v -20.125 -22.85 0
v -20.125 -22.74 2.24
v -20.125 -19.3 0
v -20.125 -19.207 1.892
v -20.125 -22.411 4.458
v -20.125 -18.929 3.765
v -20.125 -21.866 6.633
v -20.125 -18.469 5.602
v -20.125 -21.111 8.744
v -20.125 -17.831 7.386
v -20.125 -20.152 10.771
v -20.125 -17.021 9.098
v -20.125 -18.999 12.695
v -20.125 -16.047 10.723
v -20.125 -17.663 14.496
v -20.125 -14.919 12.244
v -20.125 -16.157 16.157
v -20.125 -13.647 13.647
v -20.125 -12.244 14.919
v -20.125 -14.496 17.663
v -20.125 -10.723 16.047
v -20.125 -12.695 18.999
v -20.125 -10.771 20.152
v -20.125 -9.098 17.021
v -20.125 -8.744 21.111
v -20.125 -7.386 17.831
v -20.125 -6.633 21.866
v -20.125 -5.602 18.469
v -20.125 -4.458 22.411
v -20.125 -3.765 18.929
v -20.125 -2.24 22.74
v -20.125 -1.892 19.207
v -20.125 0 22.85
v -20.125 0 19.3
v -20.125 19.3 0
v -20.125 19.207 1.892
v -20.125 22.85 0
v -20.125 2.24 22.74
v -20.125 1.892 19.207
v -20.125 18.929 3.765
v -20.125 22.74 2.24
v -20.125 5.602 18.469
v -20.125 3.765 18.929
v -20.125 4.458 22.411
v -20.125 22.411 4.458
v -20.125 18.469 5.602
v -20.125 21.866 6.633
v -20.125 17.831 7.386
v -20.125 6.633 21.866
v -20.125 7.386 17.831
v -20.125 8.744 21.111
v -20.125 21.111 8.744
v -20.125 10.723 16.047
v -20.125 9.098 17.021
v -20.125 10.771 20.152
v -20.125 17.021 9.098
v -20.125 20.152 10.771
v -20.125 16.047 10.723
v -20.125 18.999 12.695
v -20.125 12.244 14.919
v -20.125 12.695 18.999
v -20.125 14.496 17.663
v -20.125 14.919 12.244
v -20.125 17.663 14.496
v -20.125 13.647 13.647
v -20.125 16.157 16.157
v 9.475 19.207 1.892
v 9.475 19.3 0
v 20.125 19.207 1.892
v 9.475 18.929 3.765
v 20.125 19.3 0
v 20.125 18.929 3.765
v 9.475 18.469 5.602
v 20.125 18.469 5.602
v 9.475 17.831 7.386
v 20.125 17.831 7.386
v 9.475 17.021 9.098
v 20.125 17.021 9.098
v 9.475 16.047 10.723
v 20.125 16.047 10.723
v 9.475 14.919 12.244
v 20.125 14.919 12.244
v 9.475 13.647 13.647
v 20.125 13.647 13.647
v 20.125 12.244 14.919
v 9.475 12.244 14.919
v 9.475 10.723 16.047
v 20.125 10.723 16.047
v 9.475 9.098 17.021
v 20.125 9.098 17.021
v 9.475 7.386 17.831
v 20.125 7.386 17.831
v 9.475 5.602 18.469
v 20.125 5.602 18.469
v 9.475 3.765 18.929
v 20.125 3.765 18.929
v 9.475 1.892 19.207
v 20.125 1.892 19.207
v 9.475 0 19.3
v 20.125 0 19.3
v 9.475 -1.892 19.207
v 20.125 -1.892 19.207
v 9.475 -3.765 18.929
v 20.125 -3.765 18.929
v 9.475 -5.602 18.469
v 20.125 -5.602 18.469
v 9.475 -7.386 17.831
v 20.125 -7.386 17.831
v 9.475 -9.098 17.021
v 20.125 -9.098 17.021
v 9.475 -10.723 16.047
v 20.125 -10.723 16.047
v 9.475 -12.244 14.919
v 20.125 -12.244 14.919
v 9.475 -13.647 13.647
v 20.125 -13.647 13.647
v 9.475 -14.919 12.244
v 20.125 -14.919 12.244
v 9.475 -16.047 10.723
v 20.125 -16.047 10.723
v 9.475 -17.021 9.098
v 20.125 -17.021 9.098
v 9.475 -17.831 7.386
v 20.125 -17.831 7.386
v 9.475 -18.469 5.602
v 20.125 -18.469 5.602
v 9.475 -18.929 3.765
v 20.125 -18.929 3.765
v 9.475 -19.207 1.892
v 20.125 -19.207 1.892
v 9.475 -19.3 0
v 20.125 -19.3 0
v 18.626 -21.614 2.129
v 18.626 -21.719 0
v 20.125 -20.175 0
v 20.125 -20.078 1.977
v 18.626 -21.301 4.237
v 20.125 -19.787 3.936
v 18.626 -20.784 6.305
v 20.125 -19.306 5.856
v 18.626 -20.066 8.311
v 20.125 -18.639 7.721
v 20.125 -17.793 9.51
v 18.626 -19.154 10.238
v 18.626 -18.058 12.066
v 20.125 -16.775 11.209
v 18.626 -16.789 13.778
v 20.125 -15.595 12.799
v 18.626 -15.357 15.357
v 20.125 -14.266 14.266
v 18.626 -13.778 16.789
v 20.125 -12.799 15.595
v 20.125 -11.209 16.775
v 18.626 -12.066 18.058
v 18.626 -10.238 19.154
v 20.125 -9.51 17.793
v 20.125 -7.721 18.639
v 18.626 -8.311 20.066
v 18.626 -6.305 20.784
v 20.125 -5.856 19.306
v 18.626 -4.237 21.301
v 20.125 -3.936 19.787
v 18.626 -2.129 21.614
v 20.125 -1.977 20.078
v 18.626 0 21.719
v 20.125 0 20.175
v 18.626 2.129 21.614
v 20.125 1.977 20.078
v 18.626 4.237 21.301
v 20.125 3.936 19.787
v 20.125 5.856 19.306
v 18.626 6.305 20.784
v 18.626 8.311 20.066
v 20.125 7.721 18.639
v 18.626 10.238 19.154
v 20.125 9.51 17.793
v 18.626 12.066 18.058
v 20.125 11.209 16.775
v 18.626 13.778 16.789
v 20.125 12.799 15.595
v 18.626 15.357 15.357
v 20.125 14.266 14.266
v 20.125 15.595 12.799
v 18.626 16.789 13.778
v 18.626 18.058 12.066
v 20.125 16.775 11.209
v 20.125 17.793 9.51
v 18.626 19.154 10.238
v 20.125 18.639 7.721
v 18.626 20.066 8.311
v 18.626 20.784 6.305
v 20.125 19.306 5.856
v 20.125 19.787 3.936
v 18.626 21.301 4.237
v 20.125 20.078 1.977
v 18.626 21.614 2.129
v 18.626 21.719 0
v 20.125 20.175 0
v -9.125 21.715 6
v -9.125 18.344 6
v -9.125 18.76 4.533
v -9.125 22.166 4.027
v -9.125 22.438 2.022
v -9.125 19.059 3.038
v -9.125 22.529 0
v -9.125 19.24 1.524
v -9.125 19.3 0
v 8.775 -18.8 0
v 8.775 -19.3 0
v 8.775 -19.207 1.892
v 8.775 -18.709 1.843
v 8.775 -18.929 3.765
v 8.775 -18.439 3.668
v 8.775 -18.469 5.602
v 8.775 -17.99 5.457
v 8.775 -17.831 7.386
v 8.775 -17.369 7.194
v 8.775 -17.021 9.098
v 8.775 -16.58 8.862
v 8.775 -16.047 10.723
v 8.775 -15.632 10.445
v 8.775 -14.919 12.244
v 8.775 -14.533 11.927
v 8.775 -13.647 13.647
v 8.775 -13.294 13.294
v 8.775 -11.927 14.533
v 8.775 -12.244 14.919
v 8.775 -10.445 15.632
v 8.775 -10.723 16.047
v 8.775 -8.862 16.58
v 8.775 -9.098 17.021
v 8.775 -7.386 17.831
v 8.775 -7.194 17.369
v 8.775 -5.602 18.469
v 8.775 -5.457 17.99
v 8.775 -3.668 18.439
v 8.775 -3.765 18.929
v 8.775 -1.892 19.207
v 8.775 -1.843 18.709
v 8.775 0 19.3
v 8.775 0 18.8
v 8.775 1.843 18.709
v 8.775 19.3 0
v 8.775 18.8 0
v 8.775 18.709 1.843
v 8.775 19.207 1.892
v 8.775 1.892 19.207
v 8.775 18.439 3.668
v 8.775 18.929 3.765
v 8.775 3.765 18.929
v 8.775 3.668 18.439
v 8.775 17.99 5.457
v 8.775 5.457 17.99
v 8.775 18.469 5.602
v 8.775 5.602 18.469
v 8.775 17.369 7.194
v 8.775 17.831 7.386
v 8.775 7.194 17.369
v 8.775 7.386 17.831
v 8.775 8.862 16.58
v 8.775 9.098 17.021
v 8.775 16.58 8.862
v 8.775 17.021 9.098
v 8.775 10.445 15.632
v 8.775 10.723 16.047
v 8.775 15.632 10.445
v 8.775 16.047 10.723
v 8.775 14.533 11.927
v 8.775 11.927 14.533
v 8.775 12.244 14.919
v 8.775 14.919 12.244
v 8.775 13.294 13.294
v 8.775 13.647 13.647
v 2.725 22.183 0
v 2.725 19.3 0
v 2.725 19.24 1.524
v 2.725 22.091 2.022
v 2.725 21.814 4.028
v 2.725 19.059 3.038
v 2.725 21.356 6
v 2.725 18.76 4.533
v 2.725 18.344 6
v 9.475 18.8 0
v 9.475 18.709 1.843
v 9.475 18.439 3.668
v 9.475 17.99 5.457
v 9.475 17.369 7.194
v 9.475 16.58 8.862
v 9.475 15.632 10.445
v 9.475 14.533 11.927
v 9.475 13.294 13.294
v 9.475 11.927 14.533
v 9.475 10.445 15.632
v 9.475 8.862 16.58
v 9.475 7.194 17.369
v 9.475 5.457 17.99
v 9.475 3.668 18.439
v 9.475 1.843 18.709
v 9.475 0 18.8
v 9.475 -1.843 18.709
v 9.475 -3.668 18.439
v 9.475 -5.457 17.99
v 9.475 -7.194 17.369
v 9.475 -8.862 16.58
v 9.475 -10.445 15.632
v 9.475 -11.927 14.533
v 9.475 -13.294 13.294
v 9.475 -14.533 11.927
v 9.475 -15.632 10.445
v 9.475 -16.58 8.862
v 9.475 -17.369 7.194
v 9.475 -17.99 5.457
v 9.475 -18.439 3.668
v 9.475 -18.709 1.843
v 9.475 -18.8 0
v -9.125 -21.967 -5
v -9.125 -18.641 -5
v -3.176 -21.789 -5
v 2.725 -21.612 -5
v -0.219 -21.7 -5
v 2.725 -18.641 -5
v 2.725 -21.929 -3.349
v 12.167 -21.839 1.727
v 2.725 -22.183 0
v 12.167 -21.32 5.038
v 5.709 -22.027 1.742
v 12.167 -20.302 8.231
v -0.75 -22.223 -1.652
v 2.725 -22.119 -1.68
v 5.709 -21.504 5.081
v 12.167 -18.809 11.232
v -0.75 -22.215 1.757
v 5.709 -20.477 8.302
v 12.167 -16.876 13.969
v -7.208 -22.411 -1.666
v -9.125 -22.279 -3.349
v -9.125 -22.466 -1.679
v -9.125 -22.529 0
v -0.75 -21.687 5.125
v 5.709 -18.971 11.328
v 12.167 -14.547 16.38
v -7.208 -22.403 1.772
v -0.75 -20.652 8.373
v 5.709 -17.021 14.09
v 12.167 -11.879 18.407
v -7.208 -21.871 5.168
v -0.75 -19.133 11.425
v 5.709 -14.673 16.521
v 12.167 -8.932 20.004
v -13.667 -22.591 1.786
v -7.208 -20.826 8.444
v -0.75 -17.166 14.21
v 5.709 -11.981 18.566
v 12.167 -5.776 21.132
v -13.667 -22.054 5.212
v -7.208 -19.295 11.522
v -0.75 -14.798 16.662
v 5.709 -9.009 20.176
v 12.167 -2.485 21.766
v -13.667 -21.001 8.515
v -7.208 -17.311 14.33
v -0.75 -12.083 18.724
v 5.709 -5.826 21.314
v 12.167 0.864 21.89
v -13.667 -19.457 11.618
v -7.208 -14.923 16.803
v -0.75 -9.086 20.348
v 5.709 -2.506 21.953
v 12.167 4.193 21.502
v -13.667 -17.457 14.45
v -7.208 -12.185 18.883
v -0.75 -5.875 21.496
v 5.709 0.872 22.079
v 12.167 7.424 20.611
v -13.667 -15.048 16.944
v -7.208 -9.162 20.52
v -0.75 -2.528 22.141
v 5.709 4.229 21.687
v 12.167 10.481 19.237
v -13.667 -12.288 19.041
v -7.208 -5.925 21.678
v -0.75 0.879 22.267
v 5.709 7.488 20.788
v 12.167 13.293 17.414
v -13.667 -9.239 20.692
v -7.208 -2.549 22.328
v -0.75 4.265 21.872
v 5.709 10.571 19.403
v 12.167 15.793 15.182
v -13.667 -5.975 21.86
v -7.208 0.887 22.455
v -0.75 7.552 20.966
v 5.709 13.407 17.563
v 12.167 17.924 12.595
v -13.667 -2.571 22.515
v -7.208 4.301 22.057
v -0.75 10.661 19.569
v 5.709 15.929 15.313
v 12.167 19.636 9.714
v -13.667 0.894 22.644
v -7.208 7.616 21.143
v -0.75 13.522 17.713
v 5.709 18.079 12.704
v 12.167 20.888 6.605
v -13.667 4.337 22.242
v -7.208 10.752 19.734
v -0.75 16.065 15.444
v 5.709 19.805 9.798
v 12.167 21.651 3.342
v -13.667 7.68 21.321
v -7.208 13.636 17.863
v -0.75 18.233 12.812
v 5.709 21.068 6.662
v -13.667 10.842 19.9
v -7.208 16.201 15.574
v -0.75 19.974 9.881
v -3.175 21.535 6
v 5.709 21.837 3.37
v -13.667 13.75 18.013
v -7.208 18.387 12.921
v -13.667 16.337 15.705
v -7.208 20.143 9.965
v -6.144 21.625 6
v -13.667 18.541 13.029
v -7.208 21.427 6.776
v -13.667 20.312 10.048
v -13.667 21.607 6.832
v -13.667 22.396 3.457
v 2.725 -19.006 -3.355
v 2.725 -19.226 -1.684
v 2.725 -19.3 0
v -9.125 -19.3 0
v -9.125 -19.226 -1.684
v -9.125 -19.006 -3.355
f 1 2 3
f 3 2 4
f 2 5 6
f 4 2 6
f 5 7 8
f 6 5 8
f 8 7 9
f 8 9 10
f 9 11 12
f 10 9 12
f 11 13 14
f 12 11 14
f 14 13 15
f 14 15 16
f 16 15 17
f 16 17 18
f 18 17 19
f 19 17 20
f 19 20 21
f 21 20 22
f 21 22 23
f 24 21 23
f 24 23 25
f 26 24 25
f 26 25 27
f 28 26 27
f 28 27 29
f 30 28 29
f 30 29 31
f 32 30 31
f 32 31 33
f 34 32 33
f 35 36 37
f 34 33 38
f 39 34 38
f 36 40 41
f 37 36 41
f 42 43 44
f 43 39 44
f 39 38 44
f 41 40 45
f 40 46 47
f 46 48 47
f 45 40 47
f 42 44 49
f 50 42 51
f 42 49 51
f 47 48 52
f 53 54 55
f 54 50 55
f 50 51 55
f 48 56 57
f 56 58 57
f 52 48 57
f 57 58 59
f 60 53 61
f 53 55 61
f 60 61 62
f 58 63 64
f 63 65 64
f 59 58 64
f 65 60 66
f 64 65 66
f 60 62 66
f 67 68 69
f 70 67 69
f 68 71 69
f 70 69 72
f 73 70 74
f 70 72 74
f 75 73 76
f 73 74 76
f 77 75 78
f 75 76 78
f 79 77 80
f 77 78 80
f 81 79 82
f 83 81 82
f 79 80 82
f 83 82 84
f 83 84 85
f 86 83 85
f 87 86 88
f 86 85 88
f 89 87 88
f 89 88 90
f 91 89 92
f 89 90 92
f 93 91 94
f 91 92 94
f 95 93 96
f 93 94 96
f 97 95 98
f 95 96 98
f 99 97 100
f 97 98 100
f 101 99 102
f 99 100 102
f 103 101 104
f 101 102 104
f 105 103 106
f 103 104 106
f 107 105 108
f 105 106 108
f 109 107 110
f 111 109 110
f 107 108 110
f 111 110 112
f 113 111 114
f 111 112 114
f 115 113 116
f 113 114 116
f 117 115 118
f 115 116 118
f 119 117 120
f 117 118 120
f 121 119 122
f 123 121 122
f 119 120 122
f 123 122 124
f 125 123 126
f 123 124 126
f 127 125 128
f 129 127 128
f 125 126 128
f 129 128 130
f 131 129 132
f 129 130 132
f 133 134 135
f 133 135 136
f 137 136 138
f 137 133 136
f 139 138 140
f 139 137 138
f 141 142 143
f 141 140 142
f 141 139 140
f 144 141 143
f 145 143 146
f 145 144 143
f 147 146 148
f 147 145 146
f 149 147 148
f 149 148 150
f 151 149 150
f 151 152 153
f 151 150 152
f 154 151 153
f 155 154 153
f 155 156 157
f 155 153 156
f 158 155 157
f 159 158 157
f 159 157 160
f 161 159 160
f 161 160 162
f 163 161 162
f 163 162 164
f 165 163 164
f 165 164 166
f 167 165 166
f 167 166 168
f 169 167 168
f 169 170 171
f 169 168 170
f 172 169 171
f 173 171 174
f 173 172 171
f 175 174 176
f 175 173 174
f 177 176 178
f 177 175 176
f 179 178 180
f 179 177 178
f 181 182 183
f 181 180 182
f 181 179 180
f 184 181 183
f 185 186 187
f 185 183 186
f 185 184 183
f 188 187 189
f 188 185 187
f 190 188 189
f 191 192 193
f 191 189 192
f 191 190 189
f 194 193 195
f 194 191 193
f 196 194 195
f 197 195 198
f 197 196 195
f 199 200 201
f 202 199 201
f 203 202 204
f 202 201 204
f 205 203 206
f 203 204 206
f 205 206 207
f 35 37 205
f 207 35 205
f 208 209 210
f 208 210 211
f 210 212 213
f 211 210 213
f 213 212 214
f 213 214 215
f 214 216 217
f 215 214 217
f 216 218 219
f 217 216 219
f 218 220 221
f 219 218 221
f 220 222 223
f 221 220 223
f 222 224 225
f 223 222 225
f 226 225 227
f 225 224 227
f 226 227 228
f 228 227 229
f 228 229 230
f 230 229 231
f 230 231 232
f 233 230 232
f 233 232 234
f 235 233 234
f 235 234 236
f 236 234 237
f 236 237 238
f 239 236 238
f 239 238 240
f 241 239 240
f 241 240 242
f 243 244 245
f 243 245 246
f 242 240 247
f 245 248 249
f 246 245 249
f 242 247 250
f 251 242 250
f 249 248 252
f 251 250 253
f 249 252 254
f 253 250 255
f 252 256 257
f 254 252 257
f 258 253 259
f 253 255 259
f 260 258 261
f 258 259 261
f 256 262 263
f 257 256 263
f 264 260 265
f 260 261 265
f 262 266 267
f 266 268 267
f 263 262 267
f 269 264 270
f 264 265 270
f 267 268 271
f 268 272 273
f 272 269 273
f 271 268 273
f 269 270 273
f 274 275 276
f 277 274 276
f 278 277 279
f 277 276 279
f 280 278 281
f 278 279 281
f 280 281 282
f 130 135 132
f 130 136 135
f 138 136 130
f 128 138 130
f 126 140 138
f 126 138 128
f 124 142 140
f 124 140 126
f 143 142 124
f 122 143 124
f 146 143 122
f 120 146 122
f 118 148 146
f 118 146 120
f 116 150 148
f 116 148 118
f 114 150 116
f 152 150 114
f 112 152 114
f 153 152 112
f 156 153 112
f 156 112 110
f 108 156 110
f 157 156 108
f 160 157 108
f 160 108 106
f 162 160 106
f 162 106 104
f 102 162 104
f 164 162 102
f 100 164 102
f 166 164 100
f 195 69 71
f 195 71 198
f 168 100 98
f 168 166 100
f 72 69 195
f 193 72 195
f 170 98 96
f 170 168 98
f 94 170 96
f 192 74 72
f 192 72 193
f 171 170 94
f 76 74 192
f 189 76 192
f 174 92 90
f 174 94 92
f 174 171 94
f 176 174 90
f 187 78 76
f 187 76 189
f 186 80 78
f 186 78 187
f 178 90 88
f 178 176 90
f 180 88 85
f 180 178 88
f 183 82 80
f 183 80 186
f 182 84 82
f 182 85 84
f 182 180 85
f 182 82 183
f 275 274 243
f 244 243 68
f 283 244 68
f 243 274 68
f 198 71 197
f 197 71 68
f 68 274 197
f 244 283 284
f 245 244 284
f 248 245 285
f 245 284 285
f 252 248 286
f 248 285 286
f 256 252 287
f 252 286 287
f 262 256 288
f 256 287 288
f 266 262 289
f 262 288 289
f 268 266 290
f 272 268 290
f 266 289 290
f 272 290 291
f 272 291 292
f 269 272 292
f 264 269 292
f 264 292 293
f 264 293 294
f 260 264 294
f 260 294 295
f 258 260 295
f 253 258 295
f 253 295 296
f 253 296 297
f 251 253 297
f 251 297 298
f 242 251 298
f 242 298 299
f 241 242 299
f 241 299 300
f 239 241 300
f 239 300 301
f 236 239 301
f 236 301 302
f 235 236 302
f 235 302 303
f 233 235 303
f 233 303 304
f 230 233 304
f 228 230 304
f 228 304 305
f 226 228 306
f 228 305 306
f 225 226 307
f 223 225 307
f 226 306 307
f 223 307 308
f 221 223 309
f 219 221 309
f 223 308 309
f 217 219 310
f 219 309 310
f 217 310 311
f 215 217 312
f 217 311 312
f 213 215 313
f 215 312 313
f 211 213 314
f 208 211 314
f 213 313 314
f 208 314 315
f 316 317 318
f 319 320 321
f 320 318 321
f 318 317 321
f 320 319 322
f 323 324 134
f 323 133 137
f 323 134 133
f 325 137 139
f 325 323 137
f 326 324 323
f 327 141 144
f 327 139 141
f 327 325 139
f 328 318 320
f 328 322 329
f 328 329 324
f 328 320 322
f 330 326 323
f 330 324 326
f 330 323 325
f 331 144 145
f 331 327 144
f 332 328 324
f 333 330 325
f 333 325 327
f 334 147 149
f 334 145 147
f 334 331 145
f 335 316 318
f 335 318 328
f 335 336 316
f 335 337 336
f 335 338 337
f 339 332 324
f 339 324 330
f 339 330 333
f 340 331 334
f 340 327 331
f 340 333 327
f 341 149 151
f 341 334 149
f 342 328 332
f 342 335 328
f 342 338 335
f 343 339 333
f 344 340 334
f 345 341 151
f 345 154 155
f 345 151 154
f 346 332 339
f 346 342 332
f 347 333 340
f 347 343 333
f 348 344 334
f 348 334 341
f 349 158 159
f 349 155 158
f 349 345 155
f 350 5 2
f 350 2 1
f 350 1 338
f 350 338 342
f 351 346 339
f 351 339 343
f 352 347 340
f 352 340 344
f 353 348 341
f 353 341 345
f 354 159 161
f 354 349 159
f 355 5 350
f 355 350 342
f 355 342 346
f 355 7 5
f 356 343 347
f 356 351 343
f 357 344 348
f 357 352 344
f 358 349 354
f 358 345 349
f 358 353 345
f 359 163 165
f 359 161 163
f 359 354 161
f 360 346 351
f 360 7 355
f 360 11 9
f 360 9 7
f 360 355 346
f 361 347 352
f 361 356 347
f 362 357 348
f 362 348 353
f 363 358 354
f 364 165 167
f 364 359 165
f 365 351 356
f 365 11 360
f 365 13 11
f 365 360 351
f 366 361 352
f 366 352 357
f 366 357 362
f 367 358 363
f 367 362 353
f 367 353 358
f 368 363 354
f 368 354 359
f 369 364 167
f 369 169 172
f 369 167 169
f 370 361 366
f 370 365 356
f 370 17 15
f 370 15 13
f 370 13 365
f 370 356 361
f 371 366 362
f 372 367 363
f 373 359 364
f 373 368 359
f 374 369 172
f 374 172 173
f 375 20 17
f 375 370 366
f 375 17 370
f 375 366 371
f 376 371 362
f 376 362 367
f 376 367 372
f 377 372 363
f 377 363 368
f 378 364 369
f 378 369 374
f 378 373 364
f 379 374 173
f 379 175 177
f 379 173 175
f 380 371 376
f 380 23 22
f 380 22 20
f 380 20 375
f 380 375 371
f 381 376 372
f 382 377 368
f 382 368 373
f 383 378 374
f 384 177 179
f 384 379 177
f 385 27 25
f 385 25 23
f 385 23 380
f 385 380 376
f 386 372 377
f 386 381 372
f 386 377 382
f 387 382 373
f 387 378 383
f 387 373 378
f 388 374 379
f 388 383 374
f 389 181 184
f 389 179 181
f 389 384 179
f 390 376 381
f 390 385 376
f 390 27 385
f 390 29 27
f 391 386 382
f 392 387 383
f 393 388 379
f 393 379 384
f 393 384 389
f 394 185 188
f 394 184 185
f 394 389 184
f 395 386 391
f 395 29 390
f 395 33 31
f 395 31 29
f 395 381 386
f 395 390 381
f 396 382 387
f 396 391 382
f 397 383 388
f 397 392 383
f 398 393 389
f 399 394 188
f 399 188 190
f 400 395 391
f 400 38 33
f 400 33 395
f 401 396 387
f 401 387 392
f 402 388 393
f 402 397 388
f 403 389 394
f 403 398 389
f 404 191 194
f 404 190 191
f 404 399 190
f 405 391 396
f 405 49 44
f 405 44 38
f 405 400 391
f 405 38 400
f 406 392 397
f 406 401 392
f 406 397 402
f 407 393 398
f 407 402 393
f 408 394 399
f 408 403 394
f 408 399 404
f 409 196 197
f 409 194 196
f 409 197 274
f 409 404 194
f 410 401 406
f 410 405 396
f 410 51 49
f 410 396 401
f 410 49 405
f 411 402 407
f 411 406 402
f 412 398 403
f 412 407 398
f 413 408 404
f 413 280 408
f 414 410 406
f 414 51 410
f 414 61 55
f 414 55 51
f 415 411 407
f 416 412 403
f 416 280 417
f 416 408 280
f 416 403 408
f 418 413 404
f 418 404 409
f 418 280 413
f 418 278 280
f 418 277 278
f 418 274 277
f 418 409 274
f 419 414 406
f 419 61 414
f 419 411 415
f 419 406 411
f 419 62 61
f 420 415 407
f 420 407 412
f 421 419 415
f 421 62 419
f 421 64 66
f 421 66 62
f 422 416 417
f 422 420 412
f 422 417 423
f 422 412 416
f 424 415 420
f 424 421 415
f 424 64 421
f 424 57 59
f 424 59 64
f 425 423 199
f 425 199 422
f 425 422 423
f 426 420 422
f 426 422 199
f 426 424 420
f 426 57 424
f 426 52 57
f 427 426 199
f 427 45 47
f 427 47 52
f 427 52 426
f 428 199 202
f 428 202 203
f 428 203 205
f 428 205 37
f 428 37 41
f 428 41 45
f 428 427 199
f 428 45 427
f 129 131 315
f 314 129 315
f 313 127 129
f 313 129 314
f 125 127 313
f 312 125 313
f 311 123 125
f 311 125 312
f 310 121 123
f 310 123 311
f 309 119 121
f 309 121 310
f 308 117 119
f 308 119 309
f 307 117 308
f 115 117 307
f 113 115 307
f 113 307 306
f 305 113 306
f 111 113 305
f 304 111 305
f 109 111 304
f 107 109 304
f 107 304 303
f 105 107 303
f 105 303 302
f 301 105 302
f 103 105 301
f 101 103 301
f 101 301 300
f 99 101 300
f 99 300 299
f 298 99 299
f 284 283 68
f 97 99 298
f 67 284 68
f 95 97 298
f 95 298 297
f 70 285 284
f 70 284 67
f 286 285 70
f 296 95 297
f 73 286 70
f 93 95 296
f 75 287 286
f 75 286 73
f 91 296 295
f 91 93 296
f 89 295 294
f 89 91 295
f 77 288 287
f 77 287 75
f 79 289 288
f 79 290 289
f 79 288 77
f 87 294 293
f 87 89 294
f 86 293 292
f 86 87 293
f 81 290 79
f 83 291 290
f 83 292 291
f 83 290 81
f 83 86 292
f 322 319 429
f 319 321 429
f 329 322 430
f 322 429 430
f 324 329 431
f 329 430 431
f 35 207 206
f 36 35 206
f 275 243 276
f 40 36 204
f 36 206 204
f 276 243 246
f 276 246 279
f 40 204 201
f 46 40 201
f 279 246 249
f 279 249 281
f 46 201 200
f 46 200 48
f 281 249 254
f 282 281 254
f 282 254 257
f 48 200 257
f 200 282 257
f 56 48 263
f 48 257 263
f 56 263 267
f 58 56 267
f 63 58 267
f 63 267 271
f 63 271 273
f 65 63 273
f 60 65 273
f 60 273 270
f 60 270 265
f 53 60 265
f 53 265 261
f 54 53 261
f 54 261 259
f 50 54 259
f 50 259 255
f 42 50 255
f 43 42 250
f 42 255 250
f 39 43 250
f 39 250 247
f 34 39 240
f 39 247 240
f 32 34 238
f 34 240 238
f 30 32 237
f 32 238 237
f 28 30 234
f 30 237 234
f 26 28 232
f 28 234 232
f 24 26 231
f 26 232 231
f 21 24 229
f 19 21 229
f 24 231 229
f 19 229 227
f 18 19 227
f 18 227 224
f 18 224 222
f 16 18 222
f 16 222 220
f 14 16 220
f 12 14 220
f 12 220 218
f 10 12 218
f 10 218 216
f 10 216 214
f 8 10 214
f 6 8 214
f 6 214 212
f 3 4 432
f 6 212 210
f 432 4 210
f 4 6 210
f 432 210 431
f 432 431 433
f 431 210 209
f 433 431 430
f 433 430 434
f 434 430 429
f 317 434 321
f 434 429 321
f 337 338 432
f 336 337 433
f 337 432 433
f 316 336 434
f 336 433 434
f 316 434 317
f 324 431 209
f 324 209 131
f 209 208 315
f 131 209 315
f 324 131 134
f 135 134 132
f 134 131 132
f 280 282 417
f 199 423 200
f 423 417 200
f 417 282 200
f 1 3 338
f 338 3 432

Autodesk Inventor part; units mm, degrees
ref_plane "YZ Plane" through (0, 0, 0) normal (1, 0, 0) x (0, 1, 0)
ref_plane "XZ Plane" through (0, 0, 0) normal (0, 1, 0) x (-1, 0, 0)
ref_plane "XY Plane" through (0, 0, 0) normal (0, 0, 1) x (1, 0, 0)
sketch "Sketch2" plane through (0, 0, 0) normal (0, 0, 1) x (1, 0, 0)
  line L0 (-31.2032, 0) -> (39.8239, 0) construction
  line L1 (20.125, 19.3) -> (20.125, 21.675)
  line L2 (20.125, 21.675) -> (-20.125, 22.85)
  line L3 (-20.125, 22.85) -> (-20.125, 19.3)
  line L4 (0, 19.3) -> (0, 0) construction
  line L5 (8.775, 19.3) -> (8.775, 18.8)
  line L6 (8.775, 18.8) -> (9.475, 18.8)
  line L7 (9.475, 18.8) -> (9.475, 19.3)
  line L8 (-20.125, 19.3) -> (8.775, 19.3)
  line L9 (9.475, 19.3) -> (20.125, 19.3)
  line L10 (0, 22.2625) -> (0, 19.3) construction
  dimension "d2" = 40.25
  dimension "d34" = 0.5
  dimension "d36" = 0.7
  dimension "d41" = 19.3
  dimension "d45" = 11.35
  dimension "d46" = 22.85
  dimension "d47" = 21.675
revolve "Revolution1" add sketch "Sketch2" angle 270 about axis through (-31.2032, 0, 0) along (1, 0, 0)
sketch "Sketch3" plane through (0, 0, 0) normal (0, 1, 0) x (-1, 0, 0)
  line L0 (20.125, 0) -> (20.125, -22.85)
  line L1 (20.125, -22.85) -> (20.125, -22.85)
  line L2 (20.125, -22.85) -> (20.125, 0)
  line L3 (20.125, 0) -> (20.125, 0)
  line L4 (-20.125, -19.3) -> (-20.125, -21.675) projected
  line L5 (-20.125, -21.675) -> (-20.125, 0)
  line L6 (-2.725, -5) -> (-2.725, 0)
  line L7 (9.125, -5) -> (-2.725, -5)
  line L8 (-20.125, -21.675) -> (20.125, -22.85) projected
  line L9 (20.125, -22.85) -> (-20.125, -21.675)
  line L10 (-2.725, 0) -> (-20.125, 0)
  line L11 (20.125, 0) -> (9.125, 0)
  line L12 (9.125, 0) -> (9.125, -5)
  dimension "d21" = 11
  dimension "d23" = 5
  dimension "d43" = 11.85
extrude "Extrusion1" cut sketch "Sketch3" against normal blind 200
sketch "Sketch4" plane through (0, 0, 0) normal (0, 1, 0) x (-1, 0, 0)
  line L0 (-20.125, 0) -> (20.125, 0) projected
  line L1 (9.125, 0) -> (-2.725, 0)
  line L2 (-2.725, 0) -> (-2.725, 6)
  line L3 (-2.725, 6) -> (9.125, 6)
  line L4 (9.125, 6) -> (9.125, 0)
  line L5 (20.125, 22.85) -> (20.125, 0) projected
  line L6 (-20.125, 21.675) -> (-20.125, 0) projected
  point P0 (-2.725, 0)
  dimension "d24" = 6
  dimension "d25" = 11
  dimension "d44" = 11.85
extrude "Extrusion2" cut sketch "Sketch4" along normal blind 200
chamfer "Chamfer1" distance 1.5 angle 45 1 edges at (20.125, 0, 21.675)
properties part number "PLASTIC_PART"
